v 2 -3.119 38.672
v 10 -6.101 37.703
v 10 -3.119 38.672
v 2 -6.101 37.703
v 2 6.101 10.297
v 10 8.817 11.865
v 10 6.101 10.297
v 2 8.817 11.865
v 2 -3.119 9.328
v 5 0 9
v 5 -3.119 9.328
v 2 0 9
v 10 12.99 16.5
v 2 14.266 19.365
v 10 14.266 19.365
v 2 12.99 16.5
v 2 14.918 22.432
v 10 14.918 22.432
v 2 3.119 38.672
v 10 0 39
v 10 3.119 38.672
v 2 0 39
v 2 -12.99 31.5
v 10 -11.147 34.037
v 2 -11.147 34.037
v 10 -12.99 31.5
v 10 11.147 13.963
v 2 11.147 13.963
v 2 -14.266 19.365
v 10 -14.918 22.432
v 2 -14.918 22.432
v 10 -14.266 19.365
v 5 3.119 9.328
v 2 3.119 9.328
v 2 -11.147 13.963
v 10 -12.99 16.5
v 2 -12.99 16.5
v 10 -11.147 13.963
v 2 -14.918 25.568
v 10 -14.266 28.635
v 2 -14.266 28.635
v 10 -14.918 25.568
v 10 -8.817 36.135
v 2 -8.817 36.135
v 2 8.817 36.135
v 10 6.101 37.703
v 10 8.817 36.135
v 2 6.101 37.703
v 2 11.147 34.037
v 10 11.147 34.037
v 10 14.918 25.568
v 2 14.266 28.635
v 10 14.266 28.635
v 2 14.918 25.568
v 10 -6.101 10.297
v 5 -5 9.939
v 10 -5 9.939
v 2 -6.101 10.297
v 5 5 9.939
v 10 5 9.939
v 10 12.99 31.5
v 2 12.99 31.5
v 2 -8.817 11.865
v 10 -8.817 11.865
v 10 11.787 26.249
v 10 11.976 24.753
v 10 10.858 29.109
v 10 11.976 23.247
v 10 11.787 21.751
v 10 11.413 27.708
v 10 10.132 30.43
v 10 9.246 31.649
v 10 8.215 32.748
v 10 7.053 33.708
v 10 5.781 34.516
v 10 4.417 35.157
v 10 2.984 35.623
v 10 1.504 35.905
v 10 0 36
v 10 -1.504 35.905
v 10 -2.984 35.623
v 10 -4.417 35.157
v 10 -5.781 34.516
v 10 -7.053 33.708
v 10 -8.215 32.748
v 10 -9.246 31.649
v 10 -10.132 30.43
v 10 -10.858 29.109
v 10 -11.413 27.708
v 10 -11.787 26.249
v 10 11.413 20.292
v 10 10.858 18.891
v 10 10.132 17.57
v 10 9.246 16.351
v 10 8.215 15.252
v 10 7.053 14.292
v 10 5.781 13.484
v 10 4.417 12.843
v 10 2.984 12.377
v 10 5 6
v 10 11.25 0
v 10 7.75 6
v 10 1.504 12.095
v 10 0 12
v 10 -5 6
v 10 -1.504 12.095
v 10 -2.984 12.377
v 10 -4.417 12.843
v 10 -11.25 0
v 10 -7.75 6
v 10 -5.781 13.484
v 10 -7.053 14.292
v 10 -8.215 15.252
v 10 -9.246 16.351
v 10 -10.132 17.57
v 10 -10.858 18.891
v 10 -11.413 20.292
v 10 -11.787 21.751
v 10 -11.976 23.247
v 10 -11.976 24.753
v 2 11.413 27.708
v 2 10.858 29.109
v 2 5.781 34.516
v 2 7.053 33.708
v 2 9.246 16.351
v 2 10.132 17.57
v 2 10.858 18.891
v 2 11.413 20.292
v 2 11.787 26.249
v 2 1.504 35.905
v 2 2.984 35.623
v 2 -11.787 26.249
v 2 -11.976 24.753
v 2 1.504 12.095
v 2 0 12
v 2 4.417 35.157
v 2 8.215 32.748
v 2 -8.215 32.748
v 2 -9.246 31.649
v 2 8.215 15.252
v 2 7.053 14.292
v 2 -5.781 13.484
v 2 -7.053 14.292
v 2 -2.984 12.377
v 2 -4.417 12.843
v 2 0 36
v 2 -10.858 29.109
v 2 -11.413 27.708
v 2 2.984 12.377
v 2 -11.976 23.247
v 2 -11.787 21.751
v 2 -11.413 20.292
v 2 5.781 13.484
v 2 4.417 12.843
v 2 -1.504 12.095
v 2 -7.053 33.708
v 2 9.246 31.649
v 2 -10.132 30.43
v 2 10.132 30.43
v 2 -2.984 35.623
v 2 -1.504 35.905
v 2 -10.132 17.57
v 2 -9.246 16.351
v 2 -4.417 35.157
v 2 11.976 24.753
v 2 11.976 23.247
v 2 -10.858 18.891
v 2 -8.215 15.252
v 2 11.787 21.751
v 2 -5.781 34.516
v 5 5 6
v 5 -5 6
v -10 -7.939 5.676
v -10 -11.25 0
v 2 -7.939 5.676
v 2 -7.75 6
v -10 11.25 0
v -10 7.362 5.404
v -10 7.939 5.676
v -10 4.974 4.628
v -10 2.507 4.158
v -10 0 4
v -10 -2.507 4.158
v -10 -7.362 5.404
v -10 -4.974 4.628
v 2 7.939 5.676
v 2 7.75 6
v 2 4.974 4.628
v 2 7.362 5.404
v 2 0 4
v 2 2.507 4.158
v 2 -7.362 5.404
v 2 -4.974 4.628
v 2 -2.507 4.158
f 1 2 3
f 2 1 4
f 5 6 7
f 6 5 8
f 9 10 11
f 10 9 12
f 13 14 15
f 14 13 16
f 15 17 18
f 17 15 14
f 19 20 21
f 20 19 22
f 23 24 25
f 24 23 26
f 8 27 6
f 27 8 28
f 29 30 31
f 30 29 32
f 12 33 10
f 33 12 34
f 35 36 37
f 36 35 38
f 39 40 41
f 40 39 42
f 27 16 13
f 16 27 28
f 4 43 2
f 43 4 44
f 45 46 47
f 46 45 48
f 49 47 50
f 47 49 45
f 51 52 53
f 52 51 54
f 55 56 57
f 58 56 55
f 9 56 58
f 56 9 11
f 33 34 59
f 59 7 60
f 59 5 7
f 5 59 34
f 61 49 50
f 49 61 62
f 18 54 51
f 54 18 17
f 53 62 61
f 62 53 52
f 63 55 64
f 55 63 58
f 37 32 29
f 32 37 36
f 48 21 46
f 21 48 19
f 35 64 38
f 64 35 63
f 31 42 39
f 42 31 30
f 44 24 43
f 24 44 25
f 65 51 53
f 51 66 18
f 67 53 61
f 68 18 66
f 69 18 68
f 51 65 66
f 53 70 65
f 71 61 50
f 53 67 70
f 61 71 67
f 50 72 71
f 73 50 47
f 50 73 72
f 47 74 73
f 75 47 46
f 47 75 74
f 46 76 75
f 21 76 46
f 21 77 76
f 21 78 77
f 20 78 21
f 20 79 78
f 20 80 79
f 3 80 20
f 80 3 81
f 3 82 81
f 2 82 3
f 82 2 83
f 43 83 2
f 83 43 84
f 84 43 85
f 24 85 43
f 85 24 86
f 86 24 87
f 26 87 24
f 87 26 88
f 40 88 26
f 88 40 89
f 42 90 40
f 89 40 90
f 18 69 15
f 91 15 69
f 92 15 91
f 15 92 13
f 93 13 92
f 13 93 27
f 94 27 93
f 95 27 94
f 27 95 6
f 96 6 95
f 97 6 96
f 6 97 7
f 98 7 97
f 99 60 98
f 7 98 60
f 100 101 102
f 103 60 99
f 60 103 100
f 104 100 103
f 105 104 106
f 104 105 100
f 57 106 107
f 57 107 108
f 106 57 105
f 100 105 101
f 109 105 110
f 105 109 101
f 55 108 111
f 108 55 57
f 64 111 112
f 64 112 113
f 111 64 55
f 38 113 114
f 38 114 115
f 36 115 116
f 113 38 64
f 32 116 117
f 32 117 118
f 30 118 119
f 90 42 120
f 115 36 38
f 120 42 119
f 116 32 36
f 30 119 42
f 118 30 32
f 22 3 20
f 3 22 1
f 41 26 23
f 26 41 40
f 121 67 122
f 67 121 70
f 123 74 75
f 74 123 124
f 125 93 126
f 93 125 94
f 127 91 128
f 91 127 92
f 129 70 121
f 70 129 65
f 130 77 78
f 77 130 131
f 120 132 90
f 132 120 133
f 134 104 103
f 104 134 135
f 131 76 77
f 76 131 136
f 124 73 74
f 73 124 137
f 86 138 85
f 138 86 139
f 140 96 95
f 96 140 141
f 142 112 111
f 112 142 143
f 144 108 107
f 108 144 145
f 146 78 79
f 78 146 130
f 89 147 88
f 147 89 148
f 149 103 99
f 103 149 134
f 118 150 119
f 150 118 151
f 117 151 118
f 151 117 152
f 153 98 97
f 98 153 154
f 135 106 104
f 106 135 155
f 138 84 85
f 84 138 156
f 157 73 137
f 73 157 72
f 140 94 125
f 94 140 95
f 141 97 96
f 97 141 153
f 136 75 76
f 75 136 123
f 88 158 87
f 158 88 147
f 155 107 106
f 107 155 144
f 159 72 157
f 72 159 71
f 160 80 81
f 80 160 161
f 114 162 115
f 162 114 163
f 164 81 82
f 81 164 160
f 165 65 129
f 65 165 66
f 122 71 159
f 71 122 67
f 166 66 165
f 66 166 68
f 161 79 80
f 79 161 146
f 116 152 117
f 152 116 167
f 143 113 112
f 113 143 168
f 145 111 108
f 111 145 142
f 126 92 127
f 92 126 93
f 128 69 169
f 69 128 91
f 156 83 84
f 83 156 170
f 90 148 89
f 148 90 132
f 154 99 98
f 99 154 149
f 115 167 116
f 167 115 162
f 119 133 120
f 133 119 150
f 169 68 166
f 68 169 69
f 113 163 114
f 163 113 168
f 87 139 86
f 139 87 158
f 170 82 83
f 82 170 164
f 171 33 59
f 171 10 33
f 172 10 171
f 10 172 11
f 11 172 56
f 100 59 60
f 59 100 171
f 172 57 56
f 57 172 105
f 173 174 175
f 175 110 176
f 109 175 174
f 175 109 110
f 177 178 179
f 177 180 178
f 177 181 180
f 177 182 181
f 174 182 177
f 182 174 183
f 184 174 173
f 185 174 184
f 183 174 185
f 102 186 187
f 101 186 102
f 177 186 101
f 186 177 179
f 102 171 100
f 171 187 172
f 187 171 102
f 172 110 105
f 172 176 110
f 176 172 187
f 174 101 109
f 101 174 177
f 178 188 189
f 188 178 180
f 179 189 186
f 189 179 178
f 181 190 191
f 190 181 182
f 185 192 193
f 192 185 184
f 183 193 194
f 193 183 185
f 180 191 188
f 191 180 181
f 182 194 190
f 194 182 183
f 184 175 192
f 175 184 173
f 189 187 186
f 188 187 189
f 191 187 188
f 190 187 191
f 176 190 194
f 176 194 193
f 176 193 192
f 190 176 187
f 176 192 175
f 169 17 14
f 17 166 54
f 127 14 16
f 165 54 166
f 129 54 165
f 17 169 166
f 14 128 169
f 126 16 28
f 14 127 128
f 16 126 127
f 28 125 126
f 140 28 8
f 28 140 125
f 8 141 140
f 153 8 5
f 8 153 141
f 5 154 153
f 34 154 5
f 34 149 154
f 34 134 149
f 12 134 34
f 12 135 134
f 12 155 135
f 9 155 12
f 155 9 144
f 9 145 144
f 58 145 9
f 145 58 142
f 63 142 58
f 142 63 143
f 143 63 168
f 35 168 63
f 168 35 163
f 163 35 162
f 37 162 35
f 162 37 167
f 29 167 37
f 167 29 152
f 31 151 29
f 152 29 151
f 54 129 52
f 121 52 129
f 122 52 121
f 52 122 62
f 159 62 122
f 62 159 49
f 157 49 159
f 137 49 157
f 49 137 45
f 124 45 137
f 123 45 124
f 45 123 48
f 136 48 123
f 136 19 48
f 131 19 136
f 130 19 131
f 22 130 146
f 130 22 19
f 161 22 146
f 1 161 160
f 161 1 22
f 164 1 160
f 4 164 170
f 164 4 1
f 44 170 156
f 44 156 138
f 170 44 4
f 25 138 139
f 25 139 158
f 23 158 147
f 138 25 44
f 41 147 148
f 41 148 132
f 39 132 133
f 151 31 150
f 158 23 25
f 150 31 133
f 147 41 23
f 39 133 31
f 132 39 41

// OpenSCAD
holderbased=20;
holderbasew=22.5;
holderbasetopw=15.5;
holderbaseh=6;

difference(){
union(){
difference(){
translate([holderbased/2-5,0,24]) rotate([0,90,0]) cylinder(d=30, h=10,  center=true, $fn=30);

translate([holderbased/2-5,0,24]) rotate([0,90,0]) cylinder(d=24, h=12,  center=true, $fn=50);
}
translate([holderbased/2-2.5,0,holderbaseh]) cube([5,10,10], center=true);

rotate([0,-90,0])
linear_extrude(height = holderbased, center = true, convexity = 10, twist = 0)
polygon(points = [ [0, -holderbasew/2], [0,holderbasew/2], [holderbaseh,holderbasetopw/2], [holderbaseh,-holderbasetopw/2]]);
}

translate([-8,0,24]) rotate([0,90,0]) cylinder(d=40, h=20,  center=true, $fn=50);

}
